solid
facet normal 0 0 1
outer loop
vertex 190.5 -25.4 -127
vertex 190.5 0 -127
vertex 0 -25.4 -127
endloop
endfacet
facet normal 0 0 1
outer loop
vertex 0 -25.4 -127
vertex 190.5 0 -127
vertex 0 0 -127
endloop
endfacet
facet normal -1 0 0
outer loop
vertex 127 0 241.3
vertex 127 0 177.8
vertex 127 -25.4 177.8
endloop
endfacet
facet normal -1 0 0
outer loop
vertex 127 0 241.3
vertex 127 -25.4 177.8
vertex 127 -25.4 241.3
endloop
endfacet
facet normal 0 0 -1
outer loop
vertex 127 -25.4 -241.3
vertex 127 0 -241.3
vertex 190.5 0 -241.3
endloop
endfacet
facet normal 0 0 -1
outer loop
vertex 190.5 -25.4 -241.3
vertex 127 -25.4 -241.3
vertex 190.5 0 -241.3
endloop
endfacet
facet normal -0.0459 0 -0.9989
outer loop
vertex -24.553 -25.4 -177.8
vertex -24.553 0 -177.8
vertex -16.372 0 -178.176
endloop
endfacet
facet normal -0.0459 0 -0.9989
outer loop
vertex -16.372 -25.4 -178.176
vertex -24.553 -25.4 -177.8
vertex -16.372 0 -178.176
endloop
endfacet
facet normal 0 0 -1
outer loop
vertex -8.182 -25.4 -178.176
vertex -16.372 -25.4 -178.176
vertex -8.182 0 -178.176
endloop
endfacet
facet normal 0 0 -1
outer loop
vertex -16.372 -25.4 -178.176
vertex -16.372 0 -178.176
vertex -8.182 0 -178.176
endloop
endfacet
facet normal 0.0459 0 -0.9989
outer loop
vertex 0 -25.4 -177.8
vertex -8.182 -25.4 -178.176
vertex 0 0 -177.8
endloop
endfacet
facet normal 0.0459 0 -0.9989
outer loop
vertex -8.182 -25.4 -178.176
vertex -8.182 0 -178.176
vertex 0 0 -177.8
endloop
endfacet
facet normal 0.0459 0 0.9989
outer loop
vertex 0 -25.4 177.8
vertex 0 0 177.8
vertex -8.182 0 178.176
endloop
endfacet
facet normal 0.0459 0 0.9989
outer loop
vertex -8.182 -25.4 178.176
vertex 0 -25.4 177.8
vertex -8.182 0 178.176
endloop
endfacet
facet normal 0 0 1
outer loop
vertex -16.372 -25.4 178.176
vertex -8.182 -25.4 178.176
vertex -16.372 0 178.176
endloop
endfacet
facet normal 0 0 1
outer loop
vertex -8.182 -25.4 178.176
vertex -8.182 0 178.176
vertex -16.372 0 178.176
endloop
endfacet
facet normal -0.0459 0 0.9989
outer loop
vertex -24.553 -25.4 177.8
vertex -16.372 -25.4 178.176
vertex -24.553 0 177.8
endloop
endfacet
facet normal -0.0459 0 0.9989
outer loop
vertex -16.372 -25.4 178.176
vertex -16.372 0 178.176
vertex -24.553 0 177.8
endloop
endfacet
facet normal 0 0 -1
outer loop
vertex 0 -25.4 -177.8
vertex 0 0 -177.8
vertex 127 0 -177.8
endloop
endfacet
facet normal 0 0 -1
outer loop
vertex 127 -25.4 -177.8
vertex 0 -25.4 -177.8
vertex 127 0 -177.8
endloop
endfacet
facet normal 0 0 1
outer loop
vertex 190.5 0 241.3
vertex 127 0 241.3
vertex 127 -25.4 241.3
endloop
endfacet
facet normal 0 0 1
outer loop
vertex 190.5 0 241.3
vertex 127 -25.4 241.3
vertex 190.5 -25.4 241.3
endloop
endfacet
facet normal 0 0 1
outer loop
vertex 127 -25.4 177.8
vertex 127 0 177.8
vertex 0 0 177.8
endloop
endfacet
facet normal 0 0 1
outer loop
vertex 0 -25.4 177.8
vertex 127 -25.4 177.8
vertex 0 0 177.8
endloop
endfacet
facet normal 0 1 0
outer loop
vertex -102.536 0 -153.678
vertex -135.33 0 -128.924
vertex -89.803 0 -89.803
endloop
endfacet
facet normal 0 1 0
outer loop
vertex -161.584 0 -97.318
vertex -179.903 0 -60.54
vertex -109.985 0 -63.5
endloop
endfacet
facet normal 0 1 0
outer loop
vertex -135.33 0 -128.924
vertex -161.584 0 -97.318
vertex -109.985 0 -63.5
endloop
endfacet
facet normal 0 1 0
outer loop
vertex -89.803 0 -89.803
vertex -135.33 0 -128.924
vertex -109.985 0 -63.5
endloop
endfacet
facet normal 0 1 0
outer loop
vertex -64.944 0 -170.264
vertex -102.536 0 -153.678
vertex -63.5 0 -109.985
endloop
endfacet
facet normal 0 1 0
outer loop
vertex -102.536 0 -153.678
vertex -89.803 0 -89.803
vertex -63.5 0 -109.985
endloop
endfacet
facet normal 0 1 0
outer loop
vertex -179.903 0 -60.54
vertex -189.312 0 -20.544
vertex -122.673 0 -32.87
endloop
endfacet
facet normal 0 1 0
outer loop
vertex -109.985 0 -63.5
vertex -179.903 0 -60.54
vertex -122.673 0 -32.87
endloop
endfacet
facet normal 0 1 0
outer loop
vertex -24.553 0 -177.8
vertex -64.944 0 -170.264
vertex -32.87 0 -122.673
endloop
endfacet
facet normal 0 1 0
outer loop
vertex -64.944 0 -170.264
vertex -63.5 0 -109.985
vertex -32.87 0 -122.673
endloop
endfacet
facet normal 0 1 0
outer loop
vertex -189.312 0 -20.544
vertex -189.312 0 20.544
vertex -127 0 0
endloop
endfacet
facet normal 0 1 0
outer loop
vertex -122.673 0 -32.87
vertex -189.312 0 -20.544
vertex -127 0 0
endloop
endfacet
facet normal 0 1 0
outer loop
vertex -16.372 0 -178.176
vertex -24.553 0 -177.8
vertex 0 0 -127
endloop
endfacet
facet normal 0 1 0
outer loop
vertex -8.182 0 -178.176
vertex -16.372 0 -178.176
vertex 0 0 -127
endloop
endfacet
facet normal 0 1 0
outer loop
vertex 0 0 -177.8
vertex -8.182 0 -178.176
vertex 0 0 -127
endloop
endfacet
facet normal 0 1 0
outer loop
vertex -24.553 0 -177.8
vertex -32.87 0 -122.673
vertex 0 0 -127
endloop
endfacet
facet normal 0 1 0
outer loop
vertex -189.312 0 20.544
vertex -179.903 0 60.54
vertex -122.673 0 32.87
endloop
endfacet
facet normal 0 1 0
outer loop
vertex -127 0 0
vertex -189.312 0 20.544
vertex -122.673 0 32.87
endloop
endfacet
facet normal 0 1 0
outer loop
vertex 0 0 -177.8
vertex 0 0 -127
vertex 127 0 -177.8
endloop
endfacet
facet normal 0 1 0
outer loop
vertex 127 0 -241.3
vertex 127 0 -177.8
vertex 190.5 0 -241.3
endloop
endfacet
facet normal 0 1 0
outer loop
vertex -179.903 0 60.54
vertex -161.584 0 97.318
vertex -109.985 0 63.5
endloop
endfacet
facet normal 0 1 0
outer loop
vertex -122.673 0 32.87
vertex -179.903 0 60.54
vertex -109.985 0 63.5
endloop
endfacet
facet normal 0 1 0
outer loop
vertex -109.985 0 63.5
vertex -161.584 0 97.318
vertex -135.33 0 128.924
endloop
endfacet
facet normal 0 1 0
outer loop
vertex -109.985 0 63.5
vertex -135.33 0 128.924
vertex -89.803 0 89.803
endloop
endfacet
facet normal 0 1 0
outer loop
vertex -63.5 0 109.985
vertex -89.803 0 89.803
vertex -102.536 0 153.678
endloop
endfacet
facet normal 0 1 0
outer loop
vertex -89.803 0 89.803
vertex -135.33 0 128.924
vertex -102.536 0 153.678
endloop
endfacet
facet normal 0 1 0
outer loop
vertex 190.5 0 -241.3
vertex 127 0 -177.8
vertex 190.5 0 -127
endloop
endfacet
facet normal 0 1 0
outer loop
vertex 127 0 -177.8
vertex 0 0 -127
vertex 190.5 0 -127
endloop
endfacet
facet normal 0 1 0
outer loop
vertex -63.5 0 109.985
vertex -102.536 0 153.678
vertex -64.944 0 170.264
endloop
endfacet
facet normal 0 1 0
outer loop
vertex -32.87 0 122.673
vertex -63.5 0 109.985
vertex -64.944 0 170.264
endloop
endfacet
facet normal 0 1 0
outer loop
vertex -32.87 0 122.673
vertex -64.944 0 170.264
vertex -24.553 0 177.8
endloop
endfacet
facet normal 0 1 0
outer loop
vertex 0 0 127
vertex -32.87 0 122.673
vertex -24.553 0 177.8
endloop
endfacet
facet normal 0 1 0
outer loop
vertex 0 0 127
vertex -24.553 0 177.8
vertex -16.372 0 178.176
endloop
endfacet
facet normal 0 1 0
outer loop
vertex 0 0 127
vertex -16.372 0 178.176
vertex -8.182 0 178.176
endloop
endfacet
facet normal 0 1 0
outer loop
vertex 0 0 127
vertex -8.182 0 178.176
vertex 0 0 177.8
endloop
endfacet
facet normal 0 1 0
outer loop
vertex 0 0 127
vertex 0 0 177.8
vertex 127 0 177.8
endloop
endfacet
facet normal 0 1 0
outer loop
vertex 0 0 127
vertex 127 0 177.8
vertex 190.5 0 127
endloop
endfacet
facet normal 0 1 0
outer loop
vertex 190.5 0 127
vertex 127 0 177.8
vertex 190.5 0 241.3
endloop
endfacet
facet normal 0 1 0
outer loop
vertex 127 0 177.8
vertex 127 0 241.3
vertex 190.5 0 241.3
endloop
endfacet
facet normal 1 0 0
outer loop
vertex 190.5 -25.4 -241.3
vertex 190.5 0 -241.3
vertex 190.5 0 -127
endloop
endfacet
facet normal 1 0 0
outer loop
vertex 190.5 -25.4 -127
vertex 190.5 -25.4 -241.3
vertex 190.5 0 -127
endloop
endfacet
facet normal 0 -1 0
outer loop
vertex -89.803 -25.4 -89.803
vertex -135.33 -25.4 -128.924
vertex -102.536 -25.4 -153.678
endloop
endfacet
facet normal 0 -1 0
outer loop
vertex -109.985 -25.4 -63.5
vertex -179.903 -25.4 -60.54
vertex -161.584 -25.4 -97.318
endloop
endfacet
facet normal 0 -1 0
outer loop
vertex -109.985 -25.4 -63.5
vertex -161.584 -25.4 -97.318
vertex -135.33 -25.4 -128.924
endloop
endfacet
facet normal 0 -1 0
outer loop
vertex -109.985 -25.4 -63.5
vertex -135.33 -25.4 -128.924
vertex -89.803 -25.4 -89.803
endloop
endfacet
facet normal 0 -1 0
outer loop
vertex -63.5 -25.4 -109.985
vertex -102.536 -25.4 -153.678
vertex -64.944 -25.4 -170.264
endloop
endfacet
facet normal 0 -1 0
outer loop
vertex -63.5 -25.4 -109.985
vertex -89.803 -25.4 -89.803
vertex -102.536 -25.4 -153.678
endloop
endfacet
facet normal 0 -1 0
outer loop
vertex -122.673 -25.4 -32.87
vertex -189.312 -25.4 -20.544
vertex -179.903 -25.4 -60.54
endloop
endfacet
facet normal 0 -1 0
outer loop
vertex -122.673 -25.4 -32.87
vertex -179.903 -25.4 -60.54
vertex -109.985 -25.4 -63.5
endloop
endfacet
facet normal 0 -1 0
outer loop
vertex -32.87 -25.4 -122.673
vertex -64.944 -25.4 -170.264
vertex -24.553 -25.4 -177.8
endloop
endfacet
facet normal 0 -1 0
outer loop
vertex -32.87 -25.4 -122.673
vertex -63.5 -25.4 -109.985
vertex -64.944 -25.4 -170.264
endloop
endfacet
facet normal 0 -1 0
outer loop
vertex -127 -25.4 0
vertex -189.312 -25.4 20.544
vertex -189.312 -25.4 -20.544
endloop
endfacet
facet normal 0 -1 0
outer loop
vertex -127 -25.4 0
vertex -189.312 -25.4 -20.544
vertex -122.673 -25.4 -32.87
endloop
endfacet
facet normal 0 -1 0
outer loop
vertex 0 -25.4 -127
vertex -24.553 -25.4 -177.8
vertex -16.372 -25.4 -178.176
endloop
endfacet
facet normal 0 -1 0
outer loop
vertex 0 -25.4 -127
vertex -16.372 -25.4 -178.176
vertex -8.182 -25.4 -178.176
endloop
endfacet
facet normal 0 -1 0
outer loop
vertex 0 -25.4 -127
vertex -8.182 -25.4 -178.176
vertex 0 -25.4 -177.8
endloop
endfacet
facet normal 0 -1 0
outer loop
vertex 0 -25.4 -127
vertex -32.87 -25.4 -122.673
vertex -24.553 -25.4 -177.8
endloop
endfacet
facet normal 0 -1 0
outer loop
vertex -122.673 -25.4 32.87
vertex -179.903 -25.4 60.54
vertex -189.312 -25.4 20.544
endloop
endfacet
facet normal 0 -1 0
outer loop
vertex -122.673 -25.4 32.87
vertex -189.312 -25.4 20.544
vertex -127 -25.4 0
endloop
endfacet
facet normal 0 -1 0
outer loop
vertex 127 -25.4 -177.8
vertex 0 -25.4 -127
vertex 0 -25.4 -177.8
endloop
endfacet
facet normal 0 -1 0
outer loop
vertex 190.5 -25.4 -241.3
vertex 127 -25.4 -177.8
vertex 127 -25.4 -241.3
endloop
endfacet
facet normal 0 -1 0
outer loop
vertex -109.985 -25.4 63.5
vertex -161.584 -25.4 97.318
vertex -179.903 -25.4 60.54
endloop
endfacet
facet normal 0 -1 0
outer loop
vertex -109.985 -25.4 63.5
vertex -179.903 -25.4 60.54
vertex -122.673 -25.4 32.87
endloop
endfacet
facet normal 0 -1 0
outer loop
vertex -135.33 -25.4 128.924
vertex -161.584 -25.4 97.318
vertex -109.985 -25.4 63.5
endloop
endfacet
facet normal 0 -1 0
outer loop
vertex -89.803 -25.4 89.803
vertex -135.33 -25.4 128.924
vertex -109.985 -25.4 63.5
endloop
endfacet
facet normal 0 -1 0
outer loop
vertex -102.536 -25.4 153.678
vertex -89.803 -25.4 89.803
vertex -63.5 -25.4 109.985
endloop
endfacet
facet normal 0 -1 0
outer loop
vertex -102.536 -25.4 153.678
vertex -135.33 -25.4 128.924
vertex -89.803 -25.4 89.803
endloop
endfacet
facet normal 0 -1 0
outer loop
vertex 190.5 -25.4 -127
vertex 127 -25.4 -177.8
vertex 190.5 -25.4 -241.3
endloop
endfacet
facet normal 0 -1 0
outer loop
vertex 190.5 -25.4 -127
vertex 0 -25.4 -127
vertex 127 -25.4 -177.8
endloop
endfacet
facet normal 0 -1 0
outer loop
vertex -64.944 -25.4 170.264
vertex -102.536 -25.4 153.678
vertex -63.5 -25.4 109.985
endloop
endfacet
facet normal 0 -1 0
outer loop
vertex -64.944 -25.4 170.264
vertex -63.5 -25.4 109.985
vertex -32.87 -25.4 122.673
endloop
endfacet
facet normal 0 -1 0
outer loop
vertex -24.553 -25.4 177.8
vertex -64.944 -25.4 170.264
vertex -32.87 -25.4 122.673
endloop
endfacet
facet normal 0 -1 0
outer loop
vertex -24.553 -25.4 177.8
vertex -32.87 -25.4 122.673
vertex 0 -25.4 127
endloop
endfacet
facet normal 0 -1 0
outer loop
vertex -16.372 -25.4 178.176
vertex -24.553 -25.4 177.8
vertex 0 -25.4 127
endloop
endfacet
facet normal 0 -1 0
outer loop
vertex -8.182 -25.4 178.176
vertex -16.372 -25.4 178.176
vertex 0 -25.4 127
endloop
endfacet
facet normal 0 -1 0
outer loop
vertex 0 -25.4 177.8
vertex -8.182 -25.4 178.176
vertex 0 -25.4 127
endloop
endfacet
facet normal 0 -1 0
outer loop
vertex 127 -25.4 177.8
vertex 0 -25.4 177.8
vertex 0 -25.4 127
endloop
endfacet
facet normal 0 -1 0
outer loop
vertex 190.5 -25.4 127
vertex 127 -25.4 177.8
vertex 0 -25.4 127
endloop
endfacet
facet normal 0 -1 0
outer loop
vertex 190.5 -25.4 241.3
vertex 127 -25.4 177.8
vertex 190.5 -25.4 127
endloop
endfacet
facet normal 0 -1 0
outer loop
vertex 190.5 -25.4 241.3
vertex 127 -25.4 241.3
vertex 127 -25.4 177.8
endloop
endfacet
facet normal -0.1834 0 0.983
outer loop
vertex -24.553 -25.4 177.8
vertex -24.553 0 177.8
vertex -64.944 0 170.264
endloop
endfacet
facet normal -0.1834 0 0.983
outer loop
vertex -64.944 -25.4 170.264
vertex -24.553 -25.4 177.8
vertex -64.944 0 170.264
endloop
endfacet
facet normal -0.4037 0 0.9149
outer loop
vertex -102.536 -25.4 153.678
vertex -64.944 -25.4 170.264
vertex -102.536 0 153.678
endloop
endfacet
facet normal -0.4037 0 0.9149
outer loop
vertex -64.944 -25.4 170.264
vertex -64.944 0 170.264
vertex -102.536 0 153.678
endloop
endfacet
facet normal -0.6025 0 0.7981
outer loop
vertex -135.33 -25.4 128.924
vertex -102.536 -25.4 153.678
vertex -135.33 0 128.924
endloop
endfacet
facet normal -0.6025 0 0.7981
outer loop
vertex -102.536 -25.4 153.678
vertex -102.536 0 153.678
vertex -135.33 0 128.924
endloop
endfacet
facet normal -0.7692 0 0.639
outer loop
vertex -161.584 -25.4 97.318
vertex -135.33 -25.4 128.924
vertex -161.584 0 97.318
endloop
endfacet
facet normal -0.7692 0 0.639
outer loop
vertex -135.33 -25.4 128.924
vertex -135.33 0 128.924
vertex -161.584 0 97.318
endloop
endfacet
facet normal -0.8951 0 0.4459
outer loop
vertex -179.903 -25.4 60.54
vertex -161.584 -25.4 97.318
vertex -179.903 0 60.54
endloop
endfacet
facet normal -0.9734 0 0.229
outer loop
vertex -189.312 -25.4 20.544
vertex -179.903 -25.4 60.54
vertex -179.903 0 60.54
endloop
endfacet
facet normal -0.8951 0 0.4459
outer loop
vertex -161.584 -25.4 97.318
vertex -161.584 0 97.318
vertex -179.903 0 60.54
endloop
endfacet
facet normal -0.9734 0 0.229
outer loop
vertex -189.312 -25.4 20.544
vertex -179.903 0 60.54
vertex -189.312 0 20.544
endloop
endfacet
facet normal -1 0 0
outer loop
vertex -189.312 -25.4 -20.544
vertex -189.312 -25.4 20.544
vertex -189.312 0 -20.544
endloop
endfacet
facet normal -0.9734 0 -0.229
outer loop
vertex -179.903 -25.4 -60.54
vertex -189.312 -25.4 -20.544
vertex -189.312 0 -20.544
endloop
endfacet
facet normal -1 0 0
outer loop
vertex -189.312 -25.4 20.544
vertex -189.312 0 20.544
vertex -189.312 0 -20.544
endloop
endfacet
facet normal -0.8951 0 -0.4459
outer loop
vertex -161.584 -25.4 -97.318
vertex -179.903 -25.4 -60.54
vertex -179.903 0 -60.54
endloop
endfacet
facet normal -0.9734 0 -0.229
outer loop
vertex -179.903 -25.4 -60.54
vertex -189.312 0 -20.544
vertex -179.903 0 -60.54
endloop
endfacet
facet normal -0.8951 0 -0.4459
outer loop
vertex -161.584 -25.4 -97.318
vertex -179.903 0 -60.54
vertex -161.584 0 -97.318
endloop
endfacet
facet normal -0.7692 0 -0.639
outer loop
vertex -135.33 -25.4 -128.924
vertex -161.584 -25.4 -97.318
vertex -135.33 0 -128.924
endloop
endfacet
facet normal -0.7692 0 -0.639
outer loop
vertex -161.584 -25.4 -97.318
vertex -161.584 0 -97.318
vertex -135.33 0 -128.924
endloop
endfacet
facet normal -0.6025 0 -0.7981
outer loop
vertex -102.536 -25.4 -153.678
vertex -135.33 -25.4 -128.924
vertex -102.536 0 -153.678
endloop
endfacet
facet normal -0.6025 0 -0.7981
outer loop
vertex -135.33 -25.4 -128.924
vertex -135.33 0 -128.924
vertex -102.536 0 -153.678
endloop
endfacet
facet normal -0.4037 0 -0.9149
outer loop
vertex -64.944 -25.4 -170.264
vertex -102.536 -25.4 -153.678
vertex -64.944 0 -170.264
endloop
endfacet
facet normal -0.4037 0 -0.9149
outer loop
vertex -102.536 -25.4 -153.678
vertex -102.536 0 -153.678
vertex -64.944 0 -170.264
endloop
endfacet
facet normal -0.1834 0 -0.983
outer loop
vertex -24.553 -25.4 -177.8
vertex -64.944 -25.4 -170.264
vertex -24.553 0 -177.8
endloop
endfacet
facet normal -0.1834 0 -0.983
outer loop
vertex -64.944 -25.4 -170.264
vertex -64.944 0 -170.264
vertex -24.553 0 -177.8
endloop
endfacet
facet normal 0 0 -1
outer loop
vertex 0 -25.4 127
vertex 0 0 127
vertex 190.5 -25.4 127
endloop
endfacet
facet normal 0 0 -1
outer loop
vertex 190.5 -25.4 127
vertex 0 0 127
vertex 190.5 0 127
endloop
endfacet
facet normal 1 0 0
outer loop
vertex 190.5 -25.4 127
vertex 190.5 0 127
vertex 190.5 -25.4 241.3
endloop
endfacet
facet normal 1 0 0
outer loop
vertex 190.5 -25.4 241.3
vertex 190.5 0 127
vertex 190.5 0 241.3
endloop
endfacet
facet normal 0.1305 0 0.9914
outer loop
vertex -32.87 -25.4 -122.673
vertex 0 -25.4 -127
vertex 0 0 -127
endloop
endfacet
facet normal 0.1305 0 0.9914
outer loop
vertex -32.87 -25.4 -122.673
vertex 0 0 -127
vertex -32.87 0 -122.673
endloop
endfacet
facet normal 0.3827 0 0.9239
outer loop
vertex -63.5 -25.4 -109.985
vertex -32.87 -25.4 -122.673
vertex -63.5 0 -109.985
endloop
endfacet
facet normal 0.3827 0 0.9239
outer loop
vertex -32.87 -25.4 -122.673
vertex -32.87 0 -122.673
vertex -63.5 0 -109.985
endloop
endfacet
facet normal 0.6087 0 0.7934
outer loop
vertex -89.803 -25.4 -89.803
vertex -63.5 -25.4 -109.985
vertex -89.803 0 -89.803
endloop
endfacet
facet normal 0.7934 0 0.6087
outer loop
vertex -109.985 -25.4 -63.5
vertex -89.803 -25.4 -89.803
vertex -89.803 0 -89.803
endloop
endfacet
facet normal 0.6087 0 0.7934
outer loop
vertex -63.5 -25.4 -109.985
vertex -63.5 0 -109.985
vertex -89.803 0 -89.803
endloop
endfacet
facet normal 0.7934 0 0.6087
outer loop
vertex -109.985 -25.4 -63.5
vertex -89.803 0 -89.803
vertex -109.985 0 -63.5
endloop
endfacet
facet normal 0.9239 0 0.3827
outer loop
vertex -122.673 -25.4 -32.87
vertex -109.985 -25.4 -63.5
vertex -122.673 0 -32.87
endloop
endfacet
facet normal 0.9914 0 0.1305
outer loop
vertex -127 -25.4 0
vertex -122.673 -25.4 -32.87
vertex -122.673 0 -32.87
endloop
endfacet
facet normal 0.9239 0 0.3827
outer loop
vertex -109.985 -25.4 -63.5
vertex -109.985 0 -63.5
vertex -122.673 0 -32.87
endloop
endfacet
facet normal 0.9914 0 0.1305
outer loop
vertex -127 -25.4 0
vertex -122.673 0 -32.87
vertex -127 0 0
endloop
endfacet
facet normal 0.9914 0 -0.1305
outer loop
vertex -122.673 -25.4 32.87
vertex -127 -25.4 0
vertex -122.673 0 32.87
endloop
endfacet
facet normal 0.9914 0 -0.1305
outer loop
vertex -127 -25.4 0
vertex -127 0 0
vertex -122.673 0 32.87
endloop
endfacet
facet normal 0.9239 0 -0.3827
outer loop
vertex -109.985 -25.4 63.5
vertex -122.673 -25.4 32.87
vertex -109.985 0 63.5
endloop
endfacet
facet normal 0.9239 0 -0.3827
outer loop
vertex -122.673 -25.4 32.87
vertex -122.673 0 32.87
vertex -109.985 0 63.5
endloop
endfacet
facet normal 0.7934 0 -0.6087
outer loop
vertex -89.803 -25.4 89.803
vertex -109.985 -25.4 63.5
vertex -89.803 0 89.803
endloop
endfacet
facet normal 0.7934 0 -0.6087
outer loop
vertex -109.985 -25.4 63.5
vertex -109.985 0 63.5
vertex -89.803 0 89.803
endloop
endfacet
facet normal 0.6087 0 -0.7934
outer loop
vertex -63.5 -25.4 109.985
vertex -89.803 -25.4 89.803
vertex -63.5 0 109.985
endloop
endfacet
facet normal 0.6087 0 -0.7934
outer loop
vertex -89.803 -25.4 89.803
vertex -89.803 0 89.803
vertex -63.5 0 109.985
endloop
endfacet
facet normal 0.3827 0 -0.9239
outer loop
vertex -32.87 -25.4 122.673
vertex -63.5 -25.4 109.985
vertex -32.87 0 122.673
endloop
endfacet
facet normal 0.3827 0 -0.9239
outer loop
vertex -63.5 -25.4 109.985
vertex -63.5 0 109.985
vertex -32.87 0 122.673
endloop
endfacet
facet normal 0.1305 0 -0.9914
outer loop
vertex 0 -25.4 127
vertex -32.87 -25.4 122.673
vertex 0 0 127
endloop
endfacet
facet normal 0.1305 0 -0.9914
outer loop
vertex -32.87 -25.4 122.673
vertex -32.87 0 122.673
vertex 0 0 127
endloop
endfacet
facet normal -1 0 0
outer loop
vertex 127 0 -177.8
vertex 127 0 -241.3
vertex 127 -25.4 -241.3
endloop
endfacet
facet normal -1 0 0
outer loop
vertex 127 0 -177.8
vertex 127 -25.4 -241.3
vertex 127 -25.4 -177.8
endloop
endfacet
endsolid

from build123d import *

# Parameters (mm, degrees)
F0_W     = 63.5
F0_H     = 63.5
F1_DEPTH = 25.4


with BuildPart() as f1:
    # F0 (on Front) → F1 (new body)
    with BuildSketch(Plane.XZ):
        with Locations((158.75, -209.55)):
            Rectangle(F0_W, F0_H)
        with BuildLine():
            Line((127, -177.8), (190.5, -177.8))
            Line((190.5, -177.8), (190.5, -127))
            Line((190.5, -127), (0, -127))
            ThreePointArc((0, -127), (-127, 0), (0, 127))
            Line((0, 127), (63.5, 127))
            Line((63.5, 127), (190.5, 127))
            Line((190.5, 127), (190.5, 177.8))
            Line((190.5, 177.8), (127, 177.8))
            Line((127, 177.8), (0, 177.8))
            Line((0, 177.8), (-24.553333, 177.8))
            ThreePointArc((-24.553333, 177.8), (-190.5, 0), (-24.553333, -177.8))
            Line((-24.553333, -177.8), (0, -177.8))
            Line((0, -177.8), (127, -177.8))
        make_face()
        with BuildLine():
            ThreePointArc((-24.553333, -177.8), (-12.276667, -178.223333), (0, -177.8))
            Line((0, -177.8), (-24.553333, -177.8))
        make_face()
        with BuildLine():
            ThreePointArc((0, 177.8), (-12.276667, 178.223333), (-24.553333, 177.8))
            Line((-24.553333, 177.8), (0, 177.8))
        make_face()
        with Locations((158.75, 209.55)):
            Rectangle(F0_W, F0_H)
    extrude(amount=F1_DEPTH)


solid = f1.part
